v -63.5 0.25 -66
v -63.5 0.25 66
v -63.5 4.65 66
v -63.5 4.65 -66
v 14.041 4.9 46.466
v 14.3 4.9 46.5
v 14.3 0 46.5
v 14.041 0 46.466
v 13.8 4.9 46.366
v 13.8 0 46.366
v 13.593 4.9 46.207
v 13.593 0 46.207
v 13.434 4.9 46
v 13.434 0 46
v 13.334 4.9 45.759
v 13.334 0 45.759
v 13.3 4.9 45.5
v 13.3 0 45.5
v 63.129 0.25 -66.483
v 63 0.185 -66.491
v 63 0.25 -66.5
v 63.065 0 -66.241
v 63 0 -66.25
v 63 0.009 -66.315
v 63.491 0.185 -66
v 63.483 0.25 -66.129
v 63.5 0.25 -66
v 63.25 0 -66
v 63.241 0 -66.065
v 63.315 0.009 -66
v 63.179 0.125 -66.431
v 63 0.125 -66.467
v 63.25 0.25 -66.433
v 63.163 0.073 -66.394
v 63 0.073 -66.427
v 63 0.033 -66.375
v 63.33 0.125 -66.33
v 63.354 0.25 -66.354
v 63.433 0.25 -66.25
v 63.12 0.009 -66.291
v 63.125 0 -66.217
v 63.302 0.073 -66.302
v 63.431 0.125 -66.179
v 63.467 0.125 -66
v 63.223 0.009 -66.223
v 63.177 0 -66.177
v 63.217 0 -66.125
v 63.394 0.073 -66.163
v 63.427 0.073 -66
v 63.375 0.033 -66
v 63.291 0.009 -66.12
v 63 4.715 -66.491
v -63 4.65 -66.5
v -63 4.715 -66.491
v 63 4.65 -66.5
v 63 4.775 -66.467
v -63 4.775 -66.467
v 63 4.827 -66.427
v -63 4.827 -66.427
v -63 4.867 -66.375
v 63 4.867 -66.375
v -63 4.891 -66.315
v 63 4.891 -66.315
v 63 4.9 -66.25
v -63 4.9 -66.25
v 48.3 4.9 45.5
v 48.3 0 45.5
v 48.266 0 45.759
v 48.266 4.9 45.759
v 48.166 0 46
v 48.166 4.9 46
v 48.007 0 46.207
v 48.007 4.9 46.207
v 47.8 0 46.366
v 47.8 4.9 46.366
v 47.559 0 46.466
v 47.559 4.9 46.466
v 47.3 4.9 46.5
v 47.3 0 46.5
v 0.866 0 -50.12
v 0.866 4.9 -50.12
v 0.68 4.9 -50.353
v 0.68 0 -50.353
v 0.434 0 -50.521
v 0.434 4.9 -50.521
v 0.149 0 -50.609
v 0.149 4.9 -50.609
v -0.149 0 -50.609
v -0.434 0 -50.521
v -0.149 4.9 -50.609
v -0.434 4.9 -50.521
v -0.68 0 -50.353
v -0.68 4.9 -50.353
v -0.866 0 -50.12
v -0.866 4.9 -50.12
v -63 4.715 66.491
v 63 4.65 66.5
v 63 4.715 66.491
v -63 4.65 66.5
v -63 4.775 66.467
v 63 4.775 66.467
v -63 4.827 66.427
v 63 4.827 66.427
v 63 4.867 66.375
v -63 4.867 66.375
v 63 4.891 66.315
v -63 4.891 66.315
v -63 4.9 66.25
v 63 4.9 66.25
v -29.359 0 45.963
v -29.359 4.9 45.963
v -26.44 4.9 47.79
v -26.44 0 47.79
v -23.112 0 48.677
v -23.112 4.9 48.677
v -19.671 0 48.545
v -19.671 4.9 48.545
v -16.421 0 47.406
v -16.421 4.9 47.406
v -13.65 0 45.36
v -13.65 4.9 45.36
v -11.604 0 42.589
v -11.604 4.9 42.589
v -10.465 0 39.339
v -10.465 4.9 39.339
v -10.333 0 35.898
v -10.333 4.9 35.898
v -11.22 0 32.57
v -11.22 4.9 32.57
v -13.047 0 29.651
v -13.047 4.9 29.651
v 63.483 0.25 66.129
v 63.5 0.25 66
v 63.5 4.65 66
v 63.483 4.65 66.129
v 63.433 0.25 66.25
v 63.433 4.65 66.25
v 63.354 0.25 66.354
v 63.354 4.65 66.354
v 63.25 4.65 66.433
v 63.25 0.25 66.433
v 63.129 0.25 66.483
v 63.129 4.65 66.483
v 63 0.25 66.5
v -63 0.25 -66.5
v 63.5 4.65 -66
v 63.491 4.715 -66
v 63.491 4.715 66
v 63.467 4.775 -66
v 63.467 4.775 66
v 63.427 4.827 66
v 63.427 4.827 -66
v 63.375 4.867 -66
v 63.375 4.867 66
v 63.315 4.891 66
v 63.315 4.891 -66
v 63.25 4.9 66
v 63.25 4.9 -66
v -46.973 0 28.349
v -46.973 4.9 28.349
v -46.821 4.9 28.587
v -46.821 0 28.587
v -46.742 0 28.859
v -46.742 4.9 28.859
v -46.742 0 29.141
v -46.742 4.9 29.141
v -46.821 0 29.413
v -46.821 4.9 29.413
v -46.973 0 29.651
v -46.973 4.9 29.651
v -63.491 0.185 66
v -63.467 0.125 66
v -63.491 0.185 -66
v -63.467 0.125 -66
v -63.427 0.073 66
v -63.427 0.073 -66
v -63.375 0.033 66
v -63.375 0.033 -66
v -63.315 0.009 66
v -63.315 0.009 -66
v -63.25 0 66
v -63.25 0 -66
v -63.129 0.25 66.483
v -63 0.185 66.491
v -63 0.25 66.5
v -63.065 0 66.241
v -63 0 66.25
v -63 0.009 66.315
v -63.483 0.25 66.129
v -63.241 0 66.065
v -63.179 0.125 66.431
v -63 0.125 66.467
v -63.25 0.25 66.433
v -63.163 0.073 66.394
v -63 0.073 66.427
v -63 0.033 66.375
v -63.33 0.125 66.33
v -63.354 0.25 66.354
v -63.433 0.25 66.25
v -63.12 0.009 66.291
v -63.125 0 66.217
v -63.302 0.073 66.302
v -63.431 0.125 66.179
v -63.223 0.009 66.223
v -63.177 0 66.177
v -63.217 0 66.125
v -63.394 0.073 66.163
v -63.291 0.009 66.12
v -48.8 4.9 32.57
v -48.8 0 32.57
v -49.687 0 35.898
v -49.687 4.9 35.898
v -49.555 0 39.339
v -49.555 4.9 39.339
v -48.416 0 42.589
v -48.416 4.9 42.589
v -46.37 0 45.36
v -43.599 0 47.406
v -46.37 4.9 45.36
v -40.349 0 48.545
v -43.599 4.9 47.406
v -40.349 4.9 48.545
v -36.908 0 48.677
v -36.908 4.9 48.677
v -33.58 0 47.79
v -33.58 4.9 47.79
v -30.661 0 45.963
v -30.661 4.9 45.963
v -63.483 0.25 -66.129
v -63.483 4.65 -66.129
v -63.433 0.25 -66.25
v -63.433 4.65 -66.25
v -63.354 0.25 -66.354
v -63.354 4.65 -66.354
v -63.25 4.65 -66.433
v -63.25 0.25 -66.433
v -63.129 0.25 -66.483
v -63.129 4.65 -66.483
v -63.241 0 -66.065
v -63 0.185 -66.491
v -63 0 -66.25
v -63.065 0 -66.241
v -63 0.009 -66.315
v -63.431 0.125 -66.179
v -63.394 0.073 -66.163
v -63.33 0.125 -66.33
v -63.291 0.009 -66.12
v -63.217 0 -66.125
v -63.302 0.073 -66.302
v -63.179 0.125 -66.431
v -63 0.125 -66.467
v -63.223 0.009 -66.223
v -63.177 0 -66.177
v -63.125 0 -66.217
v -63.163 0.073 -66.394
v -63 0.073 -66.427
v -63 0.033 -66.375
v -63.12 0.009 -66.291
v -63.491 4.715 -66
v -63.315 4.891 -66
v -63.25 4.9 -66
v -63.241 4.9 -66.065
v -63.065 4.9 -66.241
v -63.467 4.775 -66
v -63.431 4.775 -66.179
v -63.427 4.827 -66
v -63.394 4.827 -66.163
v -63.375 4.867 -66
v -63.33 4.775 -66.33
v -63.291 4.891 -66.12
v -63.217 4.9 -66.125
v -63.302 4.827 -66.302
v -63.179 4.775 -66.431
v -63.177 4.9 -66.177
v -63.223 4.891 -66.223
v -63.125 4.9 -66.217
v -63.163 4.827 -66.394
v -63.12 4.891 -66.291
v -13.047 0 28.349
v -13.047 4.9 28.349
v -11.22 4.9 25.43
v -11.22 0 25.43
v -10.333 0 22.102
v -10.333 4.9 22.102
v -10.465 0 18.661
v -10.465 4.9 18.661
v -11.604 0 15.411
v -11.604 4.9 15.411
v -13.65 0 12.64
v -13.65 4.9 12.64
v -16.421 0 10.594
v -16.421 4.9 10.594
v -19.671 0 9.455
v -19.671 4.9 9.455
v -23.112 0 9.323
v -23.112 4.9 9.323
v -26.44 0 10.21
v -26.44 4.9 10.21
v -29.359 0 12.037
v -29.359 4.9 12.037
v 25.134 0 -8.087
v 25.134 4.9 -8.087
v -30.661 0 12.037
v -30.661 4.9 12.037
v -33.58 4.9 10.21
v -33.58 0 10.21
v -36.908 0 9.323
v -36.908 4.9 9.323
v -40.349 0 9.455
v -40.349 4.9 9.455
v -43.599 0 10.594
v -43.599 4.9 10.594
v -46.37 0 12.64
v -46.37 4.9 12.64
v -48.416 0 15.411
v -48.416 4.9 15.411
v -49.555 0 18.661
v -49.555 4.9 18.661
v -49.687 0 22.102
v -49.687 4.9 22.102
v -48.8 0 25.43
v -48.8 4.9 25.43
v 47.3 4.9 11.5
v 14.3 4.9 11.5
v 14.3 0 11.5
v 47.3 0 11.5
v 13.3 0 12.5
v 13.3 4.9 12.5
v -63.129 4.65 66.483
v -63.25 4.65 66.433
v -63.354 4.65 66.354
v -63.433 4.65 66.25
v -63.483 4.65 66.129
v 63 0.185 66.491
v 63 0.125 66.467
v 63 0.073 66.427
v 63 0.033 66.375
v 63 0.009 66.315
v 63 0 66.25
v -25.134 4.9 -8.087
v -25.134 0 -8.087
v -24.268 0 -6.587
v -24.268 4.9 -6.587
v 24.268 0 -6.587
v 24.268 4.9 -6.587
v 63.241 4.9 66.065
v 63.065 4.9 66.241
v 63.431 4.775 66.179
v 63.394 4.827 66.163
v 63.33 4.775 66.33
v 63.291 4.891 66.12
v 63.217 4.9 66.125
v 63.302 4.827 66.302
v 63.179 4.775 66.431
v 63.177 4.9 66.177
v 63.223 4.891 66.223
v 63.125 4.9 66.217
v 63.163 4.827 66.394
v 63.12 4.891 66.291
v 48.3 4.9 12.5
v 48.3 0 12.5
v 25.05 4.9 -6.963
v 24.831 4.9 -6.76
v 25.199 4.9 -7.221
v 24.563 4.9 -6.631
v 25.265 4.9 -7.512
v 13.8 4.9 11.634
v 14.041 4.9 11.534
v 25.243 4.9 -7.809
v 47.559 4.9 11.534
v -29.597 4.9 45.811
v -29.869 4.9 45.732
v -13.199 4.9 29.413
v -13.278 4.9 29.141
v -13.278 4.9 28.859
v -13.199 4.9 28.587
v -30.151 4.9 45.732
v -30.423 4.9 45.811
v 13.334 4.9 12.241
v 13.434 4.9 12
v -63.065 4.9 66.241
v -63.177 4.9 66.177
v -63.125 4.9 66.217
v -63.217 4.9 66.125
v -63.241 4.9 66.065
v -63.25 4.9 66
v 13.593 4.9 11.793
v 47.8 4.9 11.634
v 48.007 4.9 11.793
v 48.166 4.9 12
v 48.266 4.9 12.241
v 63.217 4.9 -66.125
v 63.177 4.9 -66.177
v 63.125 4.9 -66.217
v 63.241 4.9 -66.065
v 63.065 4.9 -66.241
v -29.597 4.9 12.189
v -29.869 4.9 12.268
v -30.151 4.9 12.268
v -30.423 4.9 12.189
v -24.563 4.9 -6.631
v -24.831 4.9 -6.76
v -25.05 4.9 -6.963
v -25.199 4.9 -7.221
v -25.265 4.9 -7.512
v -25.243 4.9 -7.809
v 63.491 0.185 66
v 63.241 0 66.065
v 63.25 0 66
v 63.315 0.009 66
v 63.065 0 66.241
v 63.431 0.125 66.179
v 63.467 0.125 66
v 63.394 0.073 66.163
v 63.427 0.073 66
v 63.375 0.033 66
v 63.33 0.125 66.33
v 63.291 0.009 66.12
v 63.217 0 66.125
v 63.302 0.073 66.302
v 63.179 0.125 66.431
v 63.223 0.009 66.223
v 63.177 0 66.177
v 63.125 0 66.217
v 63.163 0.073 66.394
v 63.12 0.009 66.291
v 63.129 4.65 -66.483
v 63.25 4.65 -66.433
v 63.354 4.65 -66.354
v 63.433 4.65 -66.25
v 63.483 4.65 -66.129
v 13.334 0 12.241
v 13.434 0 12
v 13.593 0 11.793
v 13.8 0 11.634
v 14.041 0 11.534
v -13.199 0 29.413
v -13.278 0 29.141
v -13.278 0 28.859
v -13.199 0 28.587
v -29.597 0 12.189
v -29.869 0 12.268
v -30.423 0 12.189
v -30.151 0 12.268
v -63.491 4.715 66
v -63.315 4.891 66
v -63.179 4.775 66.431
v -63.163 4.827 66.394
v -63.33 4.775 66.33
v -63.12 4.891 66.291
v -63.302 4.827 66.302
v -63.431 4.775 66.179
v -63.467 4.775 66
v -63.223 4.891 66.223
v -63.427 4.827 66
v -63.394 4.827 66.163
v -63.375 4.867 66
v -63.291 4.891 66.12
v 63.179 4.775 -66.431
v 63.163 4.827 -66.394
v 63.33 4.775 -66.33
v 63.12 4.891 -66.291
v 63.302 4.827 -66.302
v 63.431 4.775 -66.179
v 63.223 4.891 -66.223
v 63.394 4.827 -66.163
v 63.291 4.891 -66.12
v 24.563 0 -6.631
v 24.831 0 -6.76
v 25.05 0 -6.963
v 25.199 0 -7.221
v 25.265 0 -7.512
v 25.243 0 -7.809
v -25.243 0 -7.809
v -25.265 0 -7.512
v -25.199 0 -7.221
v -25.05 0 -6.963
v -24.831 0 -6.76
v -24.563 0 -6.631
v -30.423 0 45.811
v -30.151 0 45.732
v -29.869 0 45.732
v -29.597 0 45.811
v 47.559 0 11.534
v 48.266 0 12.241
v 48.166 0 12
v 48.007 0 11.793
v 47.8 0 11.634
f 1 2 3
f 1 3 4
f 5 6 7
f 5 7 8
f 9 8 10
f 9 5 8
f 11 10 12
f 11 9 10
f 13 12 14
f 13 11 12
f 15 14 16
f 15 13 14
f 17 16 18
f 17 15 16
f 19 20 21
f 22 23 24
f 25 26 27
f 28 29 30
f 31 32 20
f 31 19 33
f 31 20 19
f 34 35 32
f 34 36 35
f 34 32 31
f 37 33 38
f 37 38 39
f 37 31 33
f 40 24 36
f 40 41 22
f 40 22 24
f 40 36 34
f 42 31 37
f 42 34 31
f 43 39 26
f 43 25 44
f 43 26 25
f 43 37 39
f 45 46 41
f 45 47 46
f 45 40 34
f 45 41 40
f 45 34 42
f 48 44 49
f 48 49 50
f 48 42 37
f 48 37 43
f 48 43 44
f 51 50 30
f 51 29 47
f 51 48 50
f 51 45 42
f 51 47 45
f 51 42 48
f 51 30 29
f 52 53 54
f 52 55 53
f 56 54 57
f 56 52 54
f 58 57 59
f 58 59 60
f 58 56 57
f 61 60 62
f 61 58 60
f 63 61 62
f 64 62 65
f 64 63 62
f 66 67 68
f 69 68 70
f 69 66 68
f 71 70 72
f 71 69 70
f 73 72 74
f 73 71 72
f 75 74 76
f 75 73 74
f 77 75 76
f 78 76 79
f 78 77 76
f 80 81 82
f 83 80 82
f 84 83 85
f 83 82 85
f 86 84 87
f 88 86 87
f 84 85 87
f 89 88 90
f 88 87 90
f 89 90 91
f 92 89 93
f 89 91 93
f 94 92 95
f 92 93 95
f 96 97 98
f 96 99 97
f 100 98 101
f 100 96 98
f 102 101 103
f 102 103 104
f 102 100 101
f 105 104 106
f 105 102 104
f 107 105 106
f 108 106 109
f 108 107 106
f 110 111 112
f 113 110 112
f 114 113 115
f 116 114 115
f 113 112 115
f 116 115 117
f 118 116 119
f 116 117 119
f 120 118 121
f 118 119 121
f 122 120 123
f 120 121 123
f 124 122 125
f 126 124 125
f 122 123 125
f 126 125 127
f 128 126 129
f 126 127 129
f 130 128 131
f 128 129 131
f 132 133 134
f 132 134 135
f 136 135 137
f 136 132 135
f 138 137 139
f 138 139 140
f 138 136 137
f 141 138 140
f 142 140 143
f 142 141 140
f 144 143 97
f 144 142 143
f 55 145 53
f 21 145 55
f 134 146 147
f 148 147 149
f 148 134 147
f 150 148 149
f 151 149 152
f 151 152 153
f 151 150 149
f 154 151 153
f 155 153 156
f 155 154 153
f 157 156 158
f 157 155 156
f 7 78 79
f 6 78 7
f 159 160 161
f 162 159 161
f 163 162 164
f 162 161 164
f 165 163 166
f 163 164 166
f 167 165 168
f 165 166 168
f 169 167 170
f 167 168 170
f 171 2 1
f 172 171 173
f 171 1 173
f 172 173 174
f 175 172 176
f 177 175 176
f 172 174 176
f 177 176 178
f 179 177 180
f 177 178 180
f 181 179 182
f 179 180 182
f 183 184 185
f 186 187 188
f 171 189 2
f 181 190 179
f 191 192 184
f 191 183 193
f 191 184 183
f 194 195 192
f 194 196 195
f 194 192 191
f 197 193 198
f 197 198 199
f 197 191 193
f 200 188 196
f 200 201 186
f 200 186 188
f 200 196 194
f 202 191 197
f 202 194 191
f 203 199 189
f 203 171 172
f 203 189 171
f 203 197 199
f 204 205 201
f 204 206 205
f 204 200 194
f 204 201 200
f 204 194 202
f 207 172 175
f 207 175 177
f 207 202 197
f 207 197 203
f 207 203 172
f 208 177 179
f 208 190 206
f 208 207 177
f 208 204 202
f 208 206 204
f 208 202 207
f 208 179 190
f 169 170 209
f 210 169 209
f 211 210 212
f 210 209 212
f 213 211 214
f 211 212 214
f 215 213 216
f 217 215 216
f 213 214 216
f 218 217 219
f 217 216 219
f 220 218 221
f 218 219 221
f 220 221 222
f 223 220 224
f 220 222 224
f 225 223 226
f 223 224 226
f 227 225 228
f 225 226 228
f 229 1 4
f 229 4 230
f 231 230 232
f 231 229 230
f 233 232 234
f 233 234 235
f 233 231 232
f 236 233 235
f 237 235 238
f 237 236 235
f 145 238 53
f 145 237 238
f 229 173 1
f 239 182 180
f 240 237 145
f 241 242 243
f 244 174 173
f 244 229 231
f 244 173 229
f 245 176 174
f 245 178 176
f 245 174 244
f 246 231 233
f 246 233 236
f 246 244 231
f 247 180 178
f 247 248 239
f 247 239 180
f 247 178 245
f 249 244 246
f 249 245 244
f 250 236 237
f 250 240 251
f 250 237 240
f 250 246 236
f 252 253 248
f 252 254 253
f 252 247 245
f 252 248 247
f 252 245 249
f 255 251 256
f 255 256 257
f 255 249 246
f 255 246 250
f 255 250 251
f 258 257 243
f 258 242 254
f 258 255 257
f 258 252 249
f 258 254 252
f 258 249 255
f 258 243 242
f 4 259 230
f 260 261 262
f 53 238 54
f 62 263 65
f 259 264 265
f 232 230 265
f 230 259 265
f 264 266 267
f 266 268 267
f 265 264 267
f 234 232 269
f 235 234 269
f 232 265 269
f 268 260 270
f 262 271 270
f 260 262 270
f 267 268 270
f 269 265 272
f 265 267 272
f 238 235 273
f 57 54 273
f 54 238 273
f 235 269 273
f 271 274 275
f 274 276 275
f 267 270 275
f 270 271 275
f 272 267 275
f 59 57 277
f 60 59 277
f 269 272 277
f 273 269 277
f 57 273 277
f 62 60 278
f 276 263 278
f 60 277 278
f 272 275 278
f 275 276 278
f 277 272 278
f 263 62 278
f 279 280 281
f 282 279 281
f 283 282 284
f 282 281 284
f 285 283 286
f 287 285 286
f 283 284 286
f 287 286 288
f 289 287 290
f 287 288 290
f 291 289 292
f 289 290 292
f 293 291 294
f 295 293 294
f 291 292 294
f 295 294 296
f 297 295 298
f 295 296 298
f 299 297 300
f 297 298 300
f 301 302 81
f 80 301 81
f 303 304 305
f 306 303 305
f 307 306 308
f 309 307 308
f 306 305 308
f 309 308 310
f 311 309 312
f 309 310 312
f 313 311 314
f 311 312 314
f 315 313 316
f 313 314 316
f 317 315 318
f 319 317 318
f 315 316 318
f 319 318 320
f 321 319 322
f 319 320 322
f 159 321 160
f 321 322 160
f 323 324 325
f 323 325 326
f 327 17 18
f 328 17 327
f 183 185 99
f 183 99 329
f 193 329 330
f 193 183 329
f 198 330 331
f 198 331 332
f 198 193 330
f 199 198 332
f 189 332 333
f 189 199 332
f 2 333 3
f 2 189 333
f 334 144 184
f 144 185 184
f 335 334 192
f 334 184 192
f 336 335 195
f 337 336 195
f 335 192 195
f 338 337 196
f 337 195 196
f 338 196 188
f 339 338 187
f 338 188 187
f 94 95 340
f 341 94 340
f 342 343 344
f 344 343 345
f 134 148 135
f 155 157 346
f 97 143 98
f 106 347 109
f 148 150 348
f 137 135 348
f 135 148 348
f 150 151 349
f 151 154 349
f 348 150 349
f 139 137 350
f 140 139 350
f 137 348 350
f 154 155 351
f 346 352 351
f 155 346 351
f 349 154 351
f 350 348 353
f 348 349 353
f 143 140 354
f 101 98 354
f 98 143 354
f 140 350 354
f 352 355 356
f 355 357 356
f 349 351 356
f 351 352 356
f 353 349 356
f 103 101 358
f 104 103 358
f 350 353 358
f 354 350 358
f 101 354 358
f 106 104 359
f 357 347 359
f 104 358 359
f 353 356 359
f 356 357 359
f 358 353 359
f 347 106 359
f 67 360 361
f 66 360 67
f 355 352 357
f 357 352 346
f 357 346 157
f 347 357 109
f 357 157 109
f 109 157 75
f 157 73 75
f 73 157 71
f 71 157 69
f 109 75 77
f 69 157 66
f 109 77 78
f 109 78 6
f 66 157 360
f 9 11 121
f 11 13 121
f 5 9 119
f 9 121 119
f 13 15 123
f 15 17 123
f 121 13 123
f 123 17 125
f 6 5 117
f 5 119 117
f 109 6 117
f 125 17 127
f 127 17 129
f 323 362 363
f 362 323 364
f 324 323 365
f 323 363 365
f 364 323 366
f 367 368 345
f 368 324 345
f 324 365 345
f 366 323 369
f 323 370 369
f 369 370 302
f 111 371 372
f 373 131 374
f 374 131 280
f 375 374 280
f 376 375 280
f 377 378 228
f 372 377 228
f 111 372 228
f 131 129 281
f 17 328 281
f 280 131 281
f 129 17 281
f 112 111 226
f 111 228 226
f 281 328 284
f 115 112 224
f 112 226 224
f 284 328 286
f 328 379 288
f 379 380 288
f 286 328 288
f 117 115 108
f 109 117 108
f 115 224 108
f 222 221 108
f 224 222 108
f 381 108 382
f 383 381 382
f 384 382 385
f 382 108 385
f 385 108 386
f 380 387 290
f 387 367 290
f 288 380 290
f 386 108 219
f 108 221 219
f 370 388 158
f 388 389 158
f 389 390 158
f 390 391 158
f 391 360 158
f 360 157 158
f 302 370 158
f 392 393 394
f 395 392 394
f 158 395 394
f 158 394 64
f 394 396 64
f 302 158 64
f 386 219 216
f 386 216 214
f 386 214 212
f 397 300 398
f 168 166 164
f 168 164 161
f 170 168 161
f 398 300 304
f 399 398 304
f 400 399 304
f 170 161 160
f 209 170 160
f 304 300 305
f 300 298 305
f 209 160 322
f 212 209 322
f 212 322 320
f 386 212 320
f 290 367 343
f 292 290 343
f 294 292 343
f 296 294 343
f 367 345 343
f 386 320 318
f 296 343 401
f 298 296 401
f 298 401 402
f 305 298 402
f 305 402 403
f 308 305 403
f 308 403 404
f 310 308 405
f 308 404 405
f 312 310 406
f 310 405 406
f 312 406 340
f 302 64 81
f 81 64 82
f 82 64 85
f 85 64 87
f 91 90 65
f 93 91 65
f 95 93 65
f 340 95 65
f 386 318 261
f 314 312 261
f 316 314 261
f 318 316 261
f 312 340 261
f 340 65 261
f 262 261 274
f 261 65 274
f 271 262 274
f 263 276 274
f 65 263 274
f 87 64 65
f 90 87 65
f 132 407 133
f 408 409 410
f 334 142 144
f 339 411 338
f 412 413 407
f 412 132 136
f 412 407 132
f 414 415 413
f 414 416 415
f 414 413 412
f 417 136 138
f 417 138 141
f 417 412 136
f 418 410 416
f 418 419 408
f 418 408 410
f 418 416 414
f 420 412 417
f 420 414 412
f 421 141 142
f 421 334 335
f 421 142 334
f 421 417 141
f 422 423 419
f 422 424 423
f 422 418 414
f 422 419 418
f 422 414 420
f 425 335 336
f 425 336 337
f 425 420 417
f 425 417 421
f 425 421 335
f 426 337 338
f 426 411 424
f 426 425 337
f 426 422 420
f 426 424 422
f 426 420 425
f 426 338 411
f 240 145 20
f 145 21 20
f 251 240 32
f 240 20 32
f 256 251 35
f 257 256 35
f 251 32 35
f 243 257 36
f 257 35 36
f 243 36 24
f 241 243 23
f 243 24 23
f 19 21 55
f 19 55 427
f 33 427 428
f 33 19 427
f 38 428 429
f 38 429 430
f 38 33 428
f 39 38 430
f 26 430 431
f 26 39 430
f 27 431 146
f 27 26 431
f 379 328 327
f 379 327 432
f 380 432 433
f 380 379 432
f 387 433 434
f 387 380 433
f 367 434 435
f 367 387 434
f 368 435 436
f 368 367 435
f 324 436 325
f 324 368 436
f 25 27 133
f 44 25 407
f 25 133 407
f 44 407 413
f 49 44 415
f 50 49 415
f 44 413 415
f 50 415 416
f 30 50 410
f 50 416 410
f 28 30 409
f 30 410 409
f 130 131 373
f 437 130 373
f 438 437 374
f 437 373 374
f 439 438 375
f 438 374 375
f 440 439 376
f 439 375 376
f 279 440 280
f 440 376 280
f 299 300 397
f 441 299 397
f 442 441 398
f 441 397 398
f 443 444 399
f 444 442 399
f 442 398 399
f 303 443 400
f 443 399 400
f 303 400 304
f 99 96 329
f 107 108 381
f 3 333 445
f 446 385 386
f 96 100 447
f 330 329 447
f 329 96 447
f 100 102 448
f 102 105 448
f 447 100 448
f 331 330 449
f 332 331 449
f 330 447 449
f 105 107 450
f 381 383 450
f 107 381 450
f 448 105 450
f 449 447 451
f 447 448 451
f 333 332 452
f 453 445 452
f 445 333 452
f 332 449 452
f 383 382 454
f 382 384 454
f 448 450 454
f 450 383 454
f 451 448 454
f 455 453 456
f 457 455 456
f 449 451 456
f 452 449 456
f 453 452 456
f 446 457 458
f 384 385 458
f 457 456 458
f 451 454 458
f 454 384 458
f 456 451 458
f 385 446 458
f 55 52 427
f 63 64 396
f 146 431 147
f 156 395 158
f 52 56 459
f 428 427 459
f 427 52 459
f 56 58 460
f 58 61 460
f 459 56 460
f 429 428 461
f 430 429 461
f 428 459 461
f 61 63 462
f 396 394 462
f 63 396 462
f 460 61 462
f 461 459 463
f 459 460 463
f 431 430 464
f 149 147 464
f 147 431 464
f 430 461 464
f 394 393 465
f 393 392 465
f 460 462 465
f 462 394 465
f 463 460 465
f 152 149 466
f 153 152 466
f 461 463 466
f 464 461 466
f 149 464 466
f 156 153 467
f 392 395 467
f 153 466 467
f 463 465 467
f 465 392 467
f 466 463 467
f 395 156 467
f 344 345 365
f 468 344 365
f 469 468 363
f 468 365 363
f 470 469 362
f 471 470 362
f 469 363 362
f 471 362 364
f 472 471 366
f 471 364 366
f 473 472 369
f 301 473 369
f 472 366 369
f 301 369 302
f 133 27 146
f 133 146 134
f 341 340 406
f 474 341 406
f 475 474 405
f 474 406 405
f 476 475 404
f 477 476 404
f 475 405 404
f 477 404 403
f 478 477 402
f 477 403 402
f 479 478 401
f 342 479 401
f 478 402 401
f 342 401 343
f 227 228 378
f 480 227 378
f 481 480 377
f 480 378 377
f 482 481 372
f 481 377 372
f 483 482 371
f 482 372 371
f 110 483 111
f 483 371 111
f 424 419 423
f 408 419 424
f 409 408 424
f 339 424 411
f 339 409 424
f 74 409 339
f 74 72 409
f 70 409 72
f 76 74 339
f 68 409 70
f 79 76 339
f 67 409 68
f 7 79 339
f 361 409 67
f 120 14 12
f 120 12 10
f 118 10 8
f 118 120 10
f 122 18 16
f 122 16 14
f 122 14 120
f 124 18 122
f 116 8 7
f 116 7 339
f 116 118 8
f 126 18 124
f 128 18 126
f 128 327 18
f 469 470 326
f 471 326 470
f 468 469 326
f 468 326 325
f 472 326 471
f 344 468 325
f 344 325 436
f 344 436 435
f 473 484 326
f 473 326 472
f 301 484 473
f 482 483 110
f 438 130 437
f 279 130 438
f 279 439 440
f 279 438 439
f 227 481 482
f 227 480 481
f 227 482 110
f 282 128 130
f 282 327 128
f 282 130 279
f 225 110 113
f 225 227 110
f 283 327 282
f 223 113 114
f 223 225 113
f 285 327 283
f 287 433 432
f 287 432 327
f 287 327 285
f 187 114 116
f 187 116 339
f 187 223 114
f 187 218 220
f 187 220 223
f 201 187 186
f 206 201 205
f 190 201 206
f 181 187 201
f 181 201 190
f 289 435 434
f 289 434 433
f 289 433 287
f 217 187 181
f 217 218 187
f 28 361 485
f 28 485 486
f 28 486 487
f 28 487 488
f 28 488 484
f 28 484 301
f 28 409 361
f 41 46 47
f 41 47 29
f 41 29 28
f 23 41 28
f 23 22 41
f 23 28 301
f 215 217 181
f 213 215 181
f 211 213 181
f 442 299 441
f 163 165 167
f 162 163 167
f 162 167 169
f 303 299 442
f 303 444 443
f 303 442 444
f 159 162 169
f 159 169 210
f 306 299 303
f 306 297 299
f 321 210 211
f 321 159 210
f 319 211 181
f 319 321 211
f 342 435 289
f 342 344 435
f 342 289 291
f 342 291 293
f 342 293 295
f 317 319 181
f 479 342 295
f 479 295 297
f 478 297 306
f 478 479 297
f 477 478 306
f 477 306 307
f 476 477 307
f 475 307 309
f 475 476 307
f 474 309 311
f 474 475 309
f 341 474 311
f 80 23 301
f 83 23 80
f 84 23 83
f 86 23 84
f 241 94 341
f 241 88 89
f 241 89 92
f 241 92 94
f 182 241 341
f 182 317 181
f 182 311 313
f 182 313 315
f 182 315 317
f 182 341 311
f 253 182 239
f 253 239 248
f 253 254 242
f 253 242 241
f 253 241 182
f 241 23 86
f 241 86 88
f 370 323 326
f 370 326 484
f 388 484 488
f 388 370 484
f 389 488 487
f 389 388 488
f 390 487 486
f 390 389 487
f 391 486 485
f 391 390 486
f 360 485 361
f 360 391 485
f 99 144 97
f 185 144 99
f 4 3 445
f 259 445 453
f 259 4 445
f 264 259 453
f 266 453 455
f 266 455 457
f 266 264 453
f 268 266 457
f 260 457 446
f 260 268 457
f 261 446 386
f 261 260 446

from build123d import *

# Parameters (mm, degrees)
BOSS_EXTRUDE2_DEPTH = 4.9
FILLET2_R           = 0.25
CUT_EXTRUDE1_DEPTH  = 93.078825


with BuildPart() as part:
    # Sketch1 → Boss-Extrude2 (new body)
    with BuildSketch(Plane(origin=(0, 0, 0), x_dir=(1, 0, 0), z_dir=(0, 1, 0))):
        with BuildLine():
            Line((-63, 66.5), (63, 66.5))
            ThreePointArc((63, 66.5), (63.353553391, 66.353553391), (63.5, 66))
            Line((63.5, 66), (63.5, -66))
            ThreePointArc((63.5, -66), (63.353553391, -66.353553391), (63, -66.5))
            Line((63, -66.5), (-63, -66.5))
            ThreePointArc((-63, -66.5), (-63.353553391, -66.353553391), (-63.5, -66))
            Line((-63.5, -66), (-63.5, 66))
            ThreePointArc((-63.5, 66), (-63.353553391, 66.353553391), (-63, 66.5))
        make_face()
    extrude(amount=BOSS_EXTRUDE2_DEPTH)

    # Fillet2
    fillet2_edges = [part.edges().sort_by_distance(p)[0] for p in [
        (0, 0, 66.5),
        (-63.353553391, 0, 66.353553391),
        (-63.5, 0, 0),
        (-63.353553391, 0, -66.353553391),
        (-63.353553391, 4.9, 66.353553391),
        (0, 4.9, 66.5),
        (63.353553391, 4.9, 66.353553391),
        (63.5, 4.9, 0),
        (63.353553391, 4.9, -66.353553391),
        (0, 4.9, -66.5),
        (-63.353553391, 4.9, -66.353553391),
        (0, 0, -66.5),
        (-63.5, 4.9, 0),
        (63.353553391, 0, -66.353553391),
        (63.5, 0, 0),
        (63.353553391, 0, 66.353553391),
    ]]
    fillet(fillet2_edges, radius=FILLET2_R)

    # Sketch3 → Cut-Extrude1 (cut, through all)
    with BuildSketch(Plane(origin=(0, 4.9, 0), x_dir=(1, 0, 0), z_dir=(0, 1, 0))):
        with BuildLine():
            Line((-0.866025404, 50.12), (-25.133974596, 8.086679003))
            ThreePointArc((-25.133974596, 8.086679003), (-25.133974596, 7.086679003), (-24.267949192, 6.586679003))
            Line((-24.267949192, 6.586679003), (24.267949192, 6.586679003))
            ThreePointArc((24.267949192, 6.586679003), (25.133974596, 7.086679003), (25.133974596, 8.086679003))
            Line((25.133974596, 8.086679003), (0.866025404, 50.12))
            ThreePointArc((0.866025404, 50.12), (0, 50.62), (-0.866025404, 50.12))
        make_face()
        with BuildLine():
            Line((14.3, -11.5), (47.3, -11.5))
            ThreePointArc((47.3, -11.5), (48.007106781, -11.792893219), (48.3, -12.5))
            Line((48.3, -12.5), (48.3, -45.5))
            ThreePointArc((48.3, -45.5), (48.007106781, -46.207106781), (47.3, -46.5))
            Line((47.3, -46.5), (14.3, -46.5))
            ThreePointArc((14.3, -46.5), (13.592893219, -46.207106781), (13.3, -45.5))
            Line((13.3, -45.5), (13.3, -12.5))
            ThreePointArc((13.3, -12.5), (13.592893219, -11.792893219), (14.3, -11.5))
        make_face()
        with BuildLine():
            ThreePointArc((-13.047253702, -28.349154498), (-13.65, -12.64), (-29.359154498, -12.037253702))
            ThreePointArc((-29.359154498, -12.037253702), (-30.01, -12.278043498), (-30.660845502, -12.037253702))
            ThreePointArc((-30.660845502, -12.037253702), (-46.37, -12.64), (-46.972746298, -28.349154498))
            ThreePointArc((-46.972746298, -28.349154498), (-46.731956502, -29), (-46.972746298, -29.650845502))
            ThreePointArc((-46.972746298, -29.650845502), (-46.37, -45.36), (-30.660845502, -45.962746298))
            ThreePointArc((-30.660845502, -45.962746298), (-30.01, -45.721956502), (-29.359154498, -45.962746298))
            ThreePointArc((-29.359154498, -45.962746298), (-13.65, -45.36), (-13.047253702, -29.650845502))
            ThreePointArc((-13.047253702, -29.650845502), (-13.288043498, -29), (-13.047253702, -28.349154498))
        make_face()
    extrude(amount=-CUT_EXTRUDE1_DEPTH, mode=Mode.SUBTRACT)


solid = part.part
